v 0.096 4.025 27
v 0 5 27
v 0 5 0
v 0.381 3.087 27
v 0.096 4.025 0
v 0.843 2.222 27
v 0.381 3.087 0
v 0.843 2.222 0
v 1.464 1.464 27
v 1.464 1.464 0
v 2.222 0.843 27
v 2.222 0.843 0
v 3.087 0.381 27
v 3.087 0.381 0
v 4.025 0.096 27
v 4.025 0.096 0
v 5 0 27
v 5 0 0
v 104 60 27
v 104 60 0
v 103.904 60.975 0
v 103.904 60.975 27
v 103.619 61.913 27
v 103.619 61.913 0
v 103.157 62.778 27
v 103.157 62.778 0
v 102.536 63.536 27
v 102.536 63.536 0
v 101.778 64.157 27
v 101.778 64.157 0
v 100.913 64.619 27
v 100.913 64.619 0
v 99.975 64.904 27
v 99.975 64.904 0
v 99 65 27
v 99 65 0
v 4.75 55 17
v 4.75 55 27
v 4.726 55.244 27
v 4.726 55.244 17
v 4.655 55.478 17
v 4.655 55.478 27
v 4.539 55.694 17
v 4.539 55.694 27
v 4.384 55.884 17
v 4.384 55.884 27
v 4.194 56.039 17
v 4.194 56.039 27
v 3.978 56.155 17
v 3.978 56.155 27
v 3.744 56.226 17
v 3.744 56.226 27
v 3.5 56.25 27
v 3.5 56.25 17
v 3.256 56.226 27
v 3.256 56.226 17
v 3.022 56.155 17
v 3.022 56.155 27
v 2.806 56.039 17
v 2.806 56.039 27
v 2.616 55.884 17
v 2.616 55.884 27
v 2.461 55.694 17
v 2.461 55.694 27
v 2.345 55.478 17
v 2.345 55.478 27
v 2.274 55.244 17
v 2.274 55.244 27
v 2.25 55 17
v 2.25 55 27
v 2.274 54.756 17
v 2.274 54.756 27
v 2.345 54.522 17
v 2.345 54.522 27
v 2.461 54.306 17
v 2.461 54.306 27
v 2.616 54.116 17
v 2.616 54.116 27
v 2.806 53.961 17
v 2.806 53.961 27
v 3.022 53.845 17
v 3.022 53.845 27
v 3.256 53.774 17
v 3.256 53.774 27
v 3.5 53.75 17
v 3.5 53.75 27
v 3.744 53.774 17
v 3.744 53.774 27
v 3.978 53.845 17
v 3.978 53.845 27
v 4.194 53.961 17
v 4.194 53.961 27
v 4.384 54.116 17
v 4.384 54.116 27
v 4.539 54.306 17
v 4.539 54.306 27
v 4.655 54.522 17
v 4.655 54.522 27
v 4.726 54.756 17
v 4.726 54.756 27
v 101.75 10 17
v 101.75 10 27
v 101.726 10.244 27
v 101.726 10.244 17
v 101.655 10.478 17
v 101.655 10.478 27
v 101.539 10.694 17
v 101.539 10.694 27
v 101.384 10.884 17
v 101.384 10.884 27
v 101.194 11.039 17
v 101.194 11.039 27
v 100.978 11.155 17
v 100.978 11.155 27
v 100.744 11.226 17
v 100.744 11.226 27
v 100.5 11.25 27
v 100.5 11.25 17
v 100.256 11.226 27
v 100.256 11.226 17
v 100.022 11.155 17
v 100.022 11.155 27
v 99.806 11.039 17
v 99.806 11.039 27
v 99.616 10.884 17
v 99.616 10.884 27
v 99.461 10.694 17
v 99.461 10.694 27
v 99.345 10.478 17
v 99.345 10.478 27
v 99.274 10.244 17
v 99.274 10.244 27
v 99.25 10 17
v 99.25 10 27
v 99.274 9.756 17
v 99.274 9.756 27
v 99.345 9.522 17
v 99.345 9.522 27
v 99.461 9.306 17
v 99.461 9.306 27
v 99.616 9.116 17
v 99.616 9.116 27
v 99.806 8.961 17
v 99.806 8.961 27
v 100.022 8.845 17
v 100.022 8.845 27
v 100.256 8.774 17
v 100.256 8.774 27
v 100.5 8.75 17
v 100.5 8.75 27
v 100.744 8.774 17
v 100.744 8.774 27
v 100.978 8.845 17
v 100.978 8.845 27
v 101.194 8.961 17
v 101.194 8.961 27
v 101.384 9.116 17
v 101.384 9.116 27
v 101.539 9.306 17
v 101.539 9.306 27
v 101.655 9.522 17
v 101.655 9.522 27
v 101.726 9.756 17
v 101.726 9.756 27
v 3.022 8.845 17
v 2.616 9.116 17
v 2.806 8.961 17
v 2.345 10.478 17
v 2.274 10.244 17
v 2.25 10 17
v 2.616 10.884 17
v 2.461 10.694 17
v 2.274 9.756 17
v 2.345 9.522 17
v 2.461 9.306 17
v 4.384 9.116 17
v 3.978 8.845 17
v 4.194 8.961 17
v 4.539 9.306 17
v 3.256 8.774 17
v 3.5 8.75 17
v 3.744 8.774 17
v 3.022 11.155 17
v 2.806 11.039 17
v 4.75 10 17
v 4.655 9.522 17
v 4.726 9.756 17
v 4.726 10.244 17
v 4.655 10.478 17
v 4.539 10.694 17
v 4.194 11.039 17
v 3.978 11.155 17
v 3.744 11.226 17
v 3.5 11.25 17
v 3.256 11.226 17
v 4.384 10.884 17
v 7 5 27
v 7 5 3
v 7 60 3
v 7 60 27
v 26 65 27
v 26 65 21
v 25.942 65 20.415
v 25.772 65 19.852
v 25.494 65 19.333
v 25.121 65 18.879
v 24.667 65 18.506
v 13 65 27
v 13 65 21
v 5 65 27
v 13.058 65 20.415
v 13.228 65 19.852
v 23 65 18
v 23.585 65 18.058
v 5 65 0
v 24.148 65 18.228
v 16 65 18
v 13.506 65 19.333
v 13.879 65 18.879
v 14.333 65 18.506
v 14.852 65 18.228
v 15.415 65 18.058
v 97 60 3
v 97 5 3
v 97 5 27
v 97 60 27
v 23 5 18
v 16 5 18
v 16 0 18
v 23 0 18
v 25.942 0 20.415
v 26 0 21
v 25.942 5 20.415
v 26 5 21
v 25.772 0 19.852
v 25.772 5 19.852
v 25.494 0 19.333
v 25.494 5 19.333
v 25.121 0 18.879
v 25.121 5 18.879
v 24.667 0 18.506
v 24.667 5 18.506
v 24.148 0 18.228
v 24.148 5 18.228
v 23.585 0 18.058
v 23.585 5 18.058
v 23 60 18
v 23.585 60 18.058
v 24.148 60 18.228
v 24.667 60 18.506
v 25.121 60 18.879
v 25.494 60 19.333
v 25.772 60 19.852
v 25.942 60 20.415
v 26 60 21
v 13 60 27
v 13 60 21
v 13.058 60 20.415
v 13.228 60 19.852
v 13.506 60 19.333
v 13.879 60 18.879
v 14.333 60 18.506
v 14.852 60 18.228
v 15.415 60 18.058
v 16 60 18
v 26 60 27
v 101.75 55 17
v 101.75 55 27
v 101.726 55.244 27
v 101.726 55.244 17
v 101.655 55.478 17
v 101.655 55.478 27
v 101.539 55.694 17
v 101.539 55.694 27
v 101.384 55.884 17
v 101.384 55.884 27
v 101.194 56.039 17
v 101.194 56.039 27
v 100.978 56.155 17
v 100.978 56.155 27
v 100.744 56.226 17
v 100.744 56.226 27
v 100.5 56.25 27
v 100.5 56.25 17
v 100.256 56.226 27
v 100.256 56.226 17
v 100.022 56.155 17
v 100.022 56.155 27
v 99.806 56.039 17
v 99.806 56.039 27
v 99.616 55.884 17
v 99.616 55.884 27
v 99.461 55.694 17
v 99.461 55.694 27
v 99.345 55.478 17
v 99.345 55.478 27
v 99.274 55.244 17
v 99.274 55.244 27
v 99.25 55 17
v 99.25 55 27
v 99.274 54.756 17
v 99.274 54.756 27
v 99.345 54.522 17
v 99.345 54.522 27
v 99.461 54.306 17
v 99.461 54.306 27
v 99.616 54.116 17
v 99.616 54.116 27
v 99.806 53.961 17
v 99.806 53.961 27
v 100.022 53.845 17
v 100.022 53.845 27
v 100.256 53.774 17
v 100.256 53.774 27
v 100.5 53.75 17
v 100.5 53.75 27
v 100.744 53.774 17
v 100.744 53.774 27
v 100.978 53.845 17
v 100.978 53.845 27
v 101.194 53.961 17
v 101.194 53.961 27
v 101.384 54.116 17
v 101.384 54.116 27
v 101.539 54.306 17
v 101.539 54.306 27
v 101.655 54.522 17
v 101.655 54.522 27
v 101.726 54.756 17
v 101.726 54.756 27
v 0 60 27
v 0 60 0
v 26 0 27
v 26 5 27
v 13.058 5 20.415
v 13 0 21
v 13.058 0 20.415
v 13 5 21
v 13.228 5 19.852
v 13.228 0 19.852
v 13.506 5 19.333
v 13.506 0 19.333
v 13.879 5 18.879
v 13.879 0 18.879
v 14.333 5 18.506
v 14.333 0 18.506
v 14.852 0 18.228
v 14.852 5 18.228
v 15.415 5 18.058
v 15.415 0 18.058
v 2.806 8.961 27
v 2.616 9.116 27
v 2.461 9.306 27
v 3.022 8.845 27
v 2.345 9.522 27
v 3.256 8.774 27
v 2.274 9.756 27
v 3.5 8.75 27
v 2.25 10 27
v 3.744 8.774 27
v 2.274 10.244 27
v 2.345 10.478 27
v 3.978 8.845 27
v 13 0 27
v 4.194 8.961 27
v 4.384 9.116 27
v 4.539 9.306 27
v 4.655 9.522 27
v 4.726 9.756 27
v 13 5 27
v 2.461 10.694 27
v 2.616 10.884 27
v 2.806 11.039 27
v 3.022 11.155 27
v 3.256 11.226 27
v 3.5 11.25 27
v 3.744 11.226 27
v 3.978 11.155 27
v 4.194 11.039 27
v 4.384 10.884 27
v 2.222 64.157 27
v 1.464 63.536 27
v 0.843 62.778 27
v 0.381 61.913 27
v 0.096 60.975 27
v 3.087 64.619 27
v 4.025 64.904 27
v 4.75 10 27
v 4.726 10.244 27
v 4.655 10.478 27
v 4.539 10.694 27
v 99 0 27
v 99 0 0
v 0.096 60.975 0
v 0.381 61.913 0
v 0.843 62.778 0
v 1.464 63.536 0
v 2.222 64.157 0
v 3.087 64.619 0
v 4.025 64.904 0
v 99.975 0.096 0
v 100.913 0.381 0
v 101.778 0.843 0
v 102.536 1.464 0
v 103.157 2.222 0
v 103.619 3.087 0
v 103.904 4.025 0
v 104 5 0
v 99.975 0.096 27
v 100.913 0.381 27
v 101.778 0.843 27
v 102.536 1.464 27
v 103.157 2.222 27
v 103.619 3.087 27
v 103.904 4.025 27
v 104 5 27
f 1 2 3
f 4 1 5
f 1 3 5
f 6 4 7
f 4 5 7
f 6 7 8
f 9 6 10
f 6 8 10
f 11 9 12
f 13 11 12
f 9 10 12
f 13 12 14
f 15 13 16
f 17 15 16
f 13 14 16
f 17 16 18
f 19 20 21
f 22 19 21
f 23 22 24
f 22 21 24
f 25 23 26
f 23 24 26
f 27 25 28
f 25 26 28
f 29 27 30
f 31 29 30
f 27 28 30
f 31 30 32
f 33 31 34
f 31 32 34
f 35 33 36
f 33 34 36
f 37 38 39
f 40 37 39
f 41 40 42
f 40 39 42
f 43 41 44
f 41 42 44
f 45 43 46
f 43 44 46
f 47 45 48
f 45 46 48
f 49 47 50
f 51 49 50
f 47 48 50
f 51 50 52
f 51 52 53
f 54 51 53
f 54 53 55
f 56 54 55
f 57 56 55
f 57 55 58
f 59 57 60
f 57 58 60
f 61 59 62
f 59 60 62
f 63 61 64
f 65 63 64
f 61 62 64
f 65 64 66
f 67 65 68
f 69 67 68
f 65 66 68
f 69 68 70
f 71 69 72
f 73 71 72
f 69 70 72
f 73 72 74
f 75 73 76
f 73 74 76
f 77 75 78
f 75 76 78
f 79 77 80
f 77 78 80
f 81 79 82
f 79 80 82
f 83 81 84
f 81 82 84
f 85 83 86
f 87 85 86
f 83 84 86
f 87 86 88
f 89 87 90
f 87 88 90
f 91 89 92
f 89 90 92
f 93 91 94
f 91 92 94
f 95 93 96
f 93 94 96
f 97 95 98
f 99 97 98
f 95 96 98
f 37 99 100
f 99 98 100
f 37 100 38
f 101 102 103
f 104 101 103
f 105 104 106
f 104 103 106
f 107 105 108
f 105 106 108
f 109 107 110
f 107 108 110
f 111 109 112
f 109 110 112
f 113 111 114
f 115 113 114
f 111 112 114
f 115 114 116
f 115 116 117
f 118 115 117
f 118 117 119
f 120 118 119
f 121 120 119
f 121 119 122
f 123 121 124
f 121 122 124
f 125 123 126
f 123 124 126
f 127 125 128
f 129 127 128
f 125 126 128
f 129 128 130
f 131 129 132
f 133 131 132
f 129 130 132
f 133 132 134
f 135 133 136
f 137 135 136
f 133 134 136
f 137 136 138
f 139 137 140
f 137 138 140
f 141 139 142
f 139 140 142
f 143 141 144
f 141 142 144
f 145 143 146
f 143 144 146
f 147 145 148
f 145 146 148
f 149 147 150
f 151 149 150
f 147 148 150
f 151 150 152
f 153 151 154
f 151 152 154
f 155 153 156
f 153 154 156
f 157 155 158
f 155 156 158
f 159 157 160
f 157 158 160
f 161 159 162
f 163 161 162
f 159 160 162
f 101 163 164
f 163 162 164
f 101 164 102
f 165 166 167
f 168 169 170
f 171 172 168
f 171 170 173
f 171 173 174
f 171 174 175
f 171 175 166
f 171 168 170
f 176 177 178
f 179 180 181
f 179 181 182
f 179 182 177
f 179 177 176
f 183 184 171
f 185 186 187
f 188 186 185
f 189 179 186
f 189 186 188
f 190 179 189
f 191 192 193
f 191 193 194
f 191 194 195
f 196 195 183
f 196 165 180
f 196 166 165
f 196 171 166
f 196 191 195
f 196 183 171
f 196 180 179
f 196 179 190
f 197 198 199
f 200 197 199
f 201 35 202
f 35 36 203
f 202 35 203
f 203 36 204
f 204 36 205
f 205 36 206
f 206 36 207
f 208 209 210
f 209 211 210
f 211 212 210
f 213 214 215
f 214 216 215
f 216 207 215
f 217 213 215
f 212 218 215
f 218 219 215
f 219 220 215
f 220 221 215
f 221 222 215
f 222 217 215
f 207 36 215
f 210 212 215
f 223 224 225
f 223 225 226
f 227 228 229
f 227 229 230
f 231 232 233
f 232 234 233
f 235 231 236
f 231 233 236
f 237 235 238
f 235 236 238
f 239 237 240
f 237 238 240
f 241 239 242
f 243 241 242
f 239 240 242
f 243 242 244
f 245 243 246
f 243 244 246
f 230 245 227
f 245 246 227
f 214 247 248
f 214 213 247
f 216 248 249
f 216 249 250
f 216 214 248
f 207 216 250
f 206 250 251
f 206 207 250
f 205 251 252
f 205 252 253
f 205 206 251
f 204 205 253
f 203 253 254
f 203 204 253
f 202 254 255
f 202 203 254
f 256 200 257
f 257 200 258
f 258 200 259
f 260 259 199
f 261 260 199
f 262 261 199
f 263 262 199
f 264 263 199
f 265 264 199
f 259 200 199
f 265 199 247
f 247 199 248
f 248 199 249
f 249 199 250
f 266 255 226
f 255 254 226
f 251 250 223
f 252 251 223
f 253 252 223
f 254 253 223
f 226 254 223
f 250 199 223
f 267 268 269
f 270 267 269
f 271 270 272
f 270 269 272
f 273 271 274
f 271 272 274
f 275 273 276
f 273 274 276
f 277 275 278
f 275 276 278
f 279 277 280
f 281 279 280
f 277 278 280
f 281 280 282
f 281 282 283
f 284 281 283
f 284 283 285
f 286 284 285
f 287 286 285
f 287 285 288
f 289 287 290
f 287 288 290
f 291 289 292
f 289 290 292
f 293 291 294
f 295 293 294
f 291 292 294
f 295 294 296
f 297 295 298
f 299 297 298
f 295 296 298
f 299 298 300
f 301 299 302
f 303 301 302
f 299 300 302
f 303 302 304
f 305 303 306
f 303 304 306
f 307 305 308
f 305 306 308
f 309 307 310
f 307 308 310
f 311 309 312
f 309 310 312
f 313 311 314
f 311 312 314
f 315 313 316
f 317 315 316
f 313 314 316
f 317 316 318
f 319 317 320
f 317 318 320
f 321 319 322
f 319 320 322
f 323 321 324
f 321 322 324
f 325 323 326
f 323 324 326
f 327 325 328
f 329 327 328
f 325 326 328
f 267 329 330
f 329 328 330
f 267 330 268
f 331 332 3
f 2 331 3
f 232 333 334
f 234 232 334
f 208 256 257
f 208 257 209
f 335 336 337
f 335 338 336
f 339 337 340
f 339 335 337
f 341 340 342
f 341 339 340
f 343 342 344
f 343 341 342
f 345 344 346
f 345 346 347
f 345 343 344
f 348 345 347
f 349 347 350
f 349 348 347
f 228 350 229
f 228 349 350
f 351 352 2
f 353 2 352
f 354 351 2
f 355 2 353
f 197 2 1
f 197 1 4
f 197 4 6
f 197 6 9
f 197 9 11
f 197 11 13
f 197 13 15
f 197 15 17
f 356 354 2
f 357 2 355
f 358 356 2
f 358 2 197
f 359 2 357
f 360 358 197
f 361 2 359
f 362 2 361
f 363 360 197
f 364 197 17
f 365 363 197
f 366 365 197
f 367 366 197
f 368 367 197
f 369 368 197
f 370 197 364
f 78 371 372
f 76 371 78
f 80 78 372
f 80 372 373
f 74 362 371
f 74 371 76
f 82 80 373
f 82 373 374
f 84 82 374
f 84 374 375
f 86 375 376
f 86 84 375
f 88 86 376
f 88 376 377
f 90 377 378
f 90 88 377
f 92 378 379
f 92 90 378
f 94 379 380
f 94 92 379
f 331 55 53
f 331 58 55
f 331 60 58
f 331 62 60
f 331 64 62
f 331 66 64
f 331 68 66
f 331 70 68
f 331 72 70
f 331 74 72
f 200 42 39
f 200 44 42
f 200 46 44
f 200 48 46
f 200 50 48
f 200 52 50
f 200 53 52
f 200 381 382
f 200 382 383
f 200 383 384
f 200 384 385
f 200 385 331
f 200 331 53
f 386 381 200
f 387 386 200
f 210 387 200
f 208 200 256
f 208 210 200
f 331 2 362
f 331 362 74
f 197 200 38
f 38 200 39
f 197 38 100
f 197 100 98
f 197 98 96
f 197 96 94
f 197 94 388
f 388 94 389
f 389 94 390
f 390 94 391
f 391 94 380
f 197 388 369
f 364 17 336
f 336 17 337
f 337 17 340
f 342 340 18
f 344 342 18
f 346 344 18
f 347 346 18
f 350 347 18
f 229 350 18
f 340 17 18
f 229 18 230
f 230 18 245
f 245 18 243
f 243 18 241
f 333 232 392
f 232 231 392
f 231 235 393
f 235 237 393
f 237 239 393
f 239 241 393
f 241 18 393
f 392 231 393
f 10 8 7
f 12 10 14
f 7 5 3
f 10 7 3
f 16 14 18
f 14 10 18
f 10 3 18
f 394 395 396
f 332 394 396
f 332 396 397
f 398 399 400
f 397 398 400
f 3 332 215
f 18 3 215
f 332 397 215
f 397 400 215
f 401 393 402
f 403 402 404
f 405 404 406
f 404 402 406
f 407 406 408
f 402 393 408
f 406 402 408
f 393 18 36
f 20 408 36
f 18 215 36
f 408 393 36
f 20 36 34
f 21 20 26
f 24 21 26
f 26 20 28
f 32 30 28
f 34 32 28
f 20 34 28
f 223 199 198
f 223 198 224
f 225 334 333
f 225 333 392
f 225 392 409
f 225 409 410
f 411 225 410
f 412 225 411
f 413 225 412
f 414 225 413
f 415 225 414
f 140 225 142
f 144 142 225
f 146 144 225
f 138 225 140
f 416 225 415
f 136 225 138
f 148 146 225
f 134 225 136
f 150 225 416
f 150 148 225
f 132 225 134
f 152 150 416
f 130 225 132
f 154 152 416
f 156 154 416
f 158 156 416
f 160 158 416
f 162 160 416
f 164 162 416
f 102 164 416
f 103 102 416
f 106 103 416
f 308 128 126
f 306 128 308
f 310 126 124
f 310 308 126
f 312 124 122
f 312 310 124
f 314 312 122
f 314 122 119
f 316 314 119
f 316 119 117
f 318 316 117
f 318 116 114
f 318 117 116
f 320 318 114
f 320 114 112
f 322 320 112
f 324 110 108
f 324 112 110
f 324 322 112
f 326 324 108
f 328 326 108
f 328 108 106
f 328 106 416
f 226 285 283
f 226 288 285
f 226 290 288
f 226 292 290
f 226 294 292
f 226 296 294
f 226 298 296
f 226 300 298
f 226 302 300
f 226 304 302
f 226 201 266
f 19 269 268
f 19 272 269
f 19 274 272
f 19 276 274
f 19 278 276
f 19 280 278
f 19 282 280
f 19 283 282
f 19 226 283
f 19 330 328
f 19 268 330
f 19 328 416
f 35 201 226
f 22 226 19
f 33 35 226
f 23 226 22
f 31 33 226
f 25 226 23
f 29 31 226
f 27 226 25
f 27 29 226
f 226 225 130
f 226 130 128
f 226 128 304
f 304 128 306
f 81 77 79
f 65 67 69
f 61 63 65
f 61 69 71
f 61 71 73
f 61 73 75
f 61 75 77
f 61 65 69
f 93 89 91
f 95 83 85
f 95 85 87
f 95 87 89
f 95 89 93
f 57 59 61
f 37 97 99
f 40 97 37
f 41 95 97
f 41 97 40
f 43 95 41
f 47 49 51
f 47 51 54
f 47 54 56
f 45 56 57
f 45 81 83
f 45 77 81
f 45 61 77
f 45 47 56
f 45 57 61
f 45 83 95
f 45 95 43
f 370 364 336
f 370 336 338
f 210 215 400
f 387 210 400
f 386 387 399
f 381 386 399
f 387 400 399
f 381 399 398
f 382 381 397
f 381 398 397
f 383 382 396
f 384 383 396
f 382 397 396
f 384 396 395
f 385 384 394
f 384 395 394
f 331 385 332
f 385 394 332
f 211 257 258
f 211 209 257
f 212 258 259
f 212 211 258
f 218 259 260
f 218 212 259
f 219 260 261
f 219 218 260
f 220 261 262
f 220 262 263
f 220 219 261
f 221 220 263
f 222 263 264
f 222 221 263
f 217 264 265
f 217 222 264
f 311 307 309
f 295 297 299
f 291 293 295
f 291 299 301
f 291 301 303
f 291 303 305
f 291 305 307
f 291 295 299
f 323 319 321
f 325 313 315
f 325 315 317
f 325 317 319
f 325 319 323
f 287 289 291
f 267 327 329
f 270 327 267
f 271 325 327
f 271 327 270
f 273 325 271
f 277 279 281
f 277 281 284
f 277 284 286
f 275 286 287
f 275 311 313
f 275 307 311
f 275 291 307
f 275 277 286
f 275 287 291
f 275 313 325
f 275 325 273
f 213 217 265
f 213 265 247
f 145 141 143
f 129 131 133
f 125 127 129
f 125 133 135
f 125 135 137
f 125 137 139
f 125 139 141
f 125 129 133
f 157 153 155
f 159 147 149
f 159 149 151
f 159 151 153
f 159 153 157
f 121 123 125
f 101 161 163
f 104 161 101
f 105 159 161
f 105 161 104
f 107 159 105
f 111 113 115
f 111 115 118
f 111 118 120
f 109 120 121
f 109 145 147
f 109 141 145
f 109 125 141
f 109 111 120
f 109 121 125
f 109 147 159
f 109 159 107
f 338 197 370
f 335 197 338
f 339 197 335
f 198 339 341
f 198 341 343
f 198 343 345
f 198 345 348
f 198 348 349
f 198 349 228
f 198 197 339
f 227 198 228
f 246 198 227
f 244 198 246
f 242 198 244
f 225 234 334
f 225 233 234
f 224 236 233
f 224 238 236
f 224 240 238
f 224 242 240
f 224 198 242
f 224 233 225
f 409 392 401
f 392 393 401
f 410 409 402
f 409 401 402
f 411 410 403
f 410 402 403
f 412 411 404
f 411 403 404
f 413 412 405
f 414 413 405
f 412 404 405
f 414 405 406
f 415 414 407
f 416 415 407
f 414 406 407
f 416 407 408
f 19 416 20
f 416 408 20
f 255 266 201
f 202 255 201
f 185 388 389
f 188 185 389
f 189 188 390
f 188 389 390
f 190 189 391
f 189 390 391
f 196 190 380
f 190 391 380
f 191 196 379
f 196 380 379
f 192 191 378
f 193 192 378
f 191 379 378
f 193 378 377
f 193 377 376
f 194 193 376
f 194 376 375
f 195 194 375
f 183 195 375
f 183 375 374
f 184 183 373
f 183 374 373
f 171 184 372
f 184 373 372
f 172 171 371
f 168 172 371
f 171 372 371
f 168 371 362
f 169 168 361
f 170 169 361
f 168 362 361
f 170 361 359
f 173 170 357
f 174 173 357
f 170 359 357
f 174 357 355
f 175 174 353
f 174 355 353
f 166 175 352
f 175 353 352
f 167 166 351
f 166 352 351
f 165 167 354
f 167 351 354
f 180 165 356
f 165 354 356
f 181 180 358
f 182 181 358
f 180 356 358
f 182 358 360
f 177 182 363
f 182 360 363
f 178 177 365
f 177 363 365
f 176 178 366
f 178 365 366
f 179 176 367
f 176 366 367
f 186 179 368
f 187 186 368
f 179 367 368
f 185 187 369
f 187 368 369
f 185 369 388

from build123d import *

# Parameters (mm, degrees)
F1_DEPTH = 3
F2_W     = 90
F2_H     = 55
F3_DEPTH = 24
F4_R     = 1.25
F5_DEPTH = 10
F6_W     = 13
F6_H     = 65
F7_DEPTH = 9
F8_R     = 3


with BuildPart() as f1:
    # F0 (on Top) → F1 (new body)
    with BuildSketch(Plane.XY):
        with BuildLine():
            ThreePointArc((0, 5), (1.464466, 1.464466), (5, 0))
            Line((5, 0), (99, 0))
            ThreePointArc((99, 0), (102.535534, 1.464466), (104, 5))
            Line((104, 5), (104, 60))
            ThreePointArc((104, 60), (102.535534, 63.535534), (99, 65))
            Line((99, 65), (5, 65))
            ThreePointArc((5, 65), (1.464466, 63.535534), (0, 60))
            Line((0, 60), (0, 5))
        make_face()
    extrude(amount=F1_DEPTH)

    # F2 (on face) → F3 (join)
    with BuildSketch(Plane.XY.offset(3)):
        with BuildLine():
            Line((0, 60), (0, 5))
            ThreePointArc((0, 5), (1.464466, 1.464466), (5, 0))
            Line((5, 0), (99, 0))
            ThreePointArc((99, 0), (102.535534, 1.464466), (104, 5))
            Line((104, 5), (104, 60))
            ThreePointArc((104, 60), (102.535534, 63.535534), (99, 65))
            Line((99, 65), (5, 65))
            ThreePointArc((5, 65), (1.464466, 63.535534), (0, 60))
        make_face()
        with Locations((52, 32.5)):
            Rectangle(F2_W, F2_H, mode=Mode.SUBTRACT)
    extrude(amount=F3_DEPTH)

    # F4 (on face) → F5 (cut)
    with BuildSketch(Plane.XY.offset(27)):
        with Locations((3.5, 10)):
            Circle(F4_R)
        with Locations((100.5, 55)):
            Circle(F4_R)
        with Locations((100.5, 10)):
            Circle(F4_R)
        with Locations((3.5, 55)):
            Circle(F4_R)
    extrude(amount=-F5_DEPTH, mode=Mode.SUBTRACT)

    # F6 (on face) → F7 (cut)
    with BuildSketch(Plane.XY.offset(27)):
        with Locations((19.5, 32.5)):
            Rectangle(F6_W, F6_H)
    extrude(amount=-F7_DEPTH, mode=Mode.SUBTRACT)

    # F8
    f8_edges = [f1.edges().sort_by_distance(p)[0] for p in [
        (26, 2.5, 18),
        (26, 62.5, 18),
        (13, 62.5, 18),
        (13, 2.5, 18),
    ]]
    fillet(f8_edges, radius=F8_R)


solid = f1.part
